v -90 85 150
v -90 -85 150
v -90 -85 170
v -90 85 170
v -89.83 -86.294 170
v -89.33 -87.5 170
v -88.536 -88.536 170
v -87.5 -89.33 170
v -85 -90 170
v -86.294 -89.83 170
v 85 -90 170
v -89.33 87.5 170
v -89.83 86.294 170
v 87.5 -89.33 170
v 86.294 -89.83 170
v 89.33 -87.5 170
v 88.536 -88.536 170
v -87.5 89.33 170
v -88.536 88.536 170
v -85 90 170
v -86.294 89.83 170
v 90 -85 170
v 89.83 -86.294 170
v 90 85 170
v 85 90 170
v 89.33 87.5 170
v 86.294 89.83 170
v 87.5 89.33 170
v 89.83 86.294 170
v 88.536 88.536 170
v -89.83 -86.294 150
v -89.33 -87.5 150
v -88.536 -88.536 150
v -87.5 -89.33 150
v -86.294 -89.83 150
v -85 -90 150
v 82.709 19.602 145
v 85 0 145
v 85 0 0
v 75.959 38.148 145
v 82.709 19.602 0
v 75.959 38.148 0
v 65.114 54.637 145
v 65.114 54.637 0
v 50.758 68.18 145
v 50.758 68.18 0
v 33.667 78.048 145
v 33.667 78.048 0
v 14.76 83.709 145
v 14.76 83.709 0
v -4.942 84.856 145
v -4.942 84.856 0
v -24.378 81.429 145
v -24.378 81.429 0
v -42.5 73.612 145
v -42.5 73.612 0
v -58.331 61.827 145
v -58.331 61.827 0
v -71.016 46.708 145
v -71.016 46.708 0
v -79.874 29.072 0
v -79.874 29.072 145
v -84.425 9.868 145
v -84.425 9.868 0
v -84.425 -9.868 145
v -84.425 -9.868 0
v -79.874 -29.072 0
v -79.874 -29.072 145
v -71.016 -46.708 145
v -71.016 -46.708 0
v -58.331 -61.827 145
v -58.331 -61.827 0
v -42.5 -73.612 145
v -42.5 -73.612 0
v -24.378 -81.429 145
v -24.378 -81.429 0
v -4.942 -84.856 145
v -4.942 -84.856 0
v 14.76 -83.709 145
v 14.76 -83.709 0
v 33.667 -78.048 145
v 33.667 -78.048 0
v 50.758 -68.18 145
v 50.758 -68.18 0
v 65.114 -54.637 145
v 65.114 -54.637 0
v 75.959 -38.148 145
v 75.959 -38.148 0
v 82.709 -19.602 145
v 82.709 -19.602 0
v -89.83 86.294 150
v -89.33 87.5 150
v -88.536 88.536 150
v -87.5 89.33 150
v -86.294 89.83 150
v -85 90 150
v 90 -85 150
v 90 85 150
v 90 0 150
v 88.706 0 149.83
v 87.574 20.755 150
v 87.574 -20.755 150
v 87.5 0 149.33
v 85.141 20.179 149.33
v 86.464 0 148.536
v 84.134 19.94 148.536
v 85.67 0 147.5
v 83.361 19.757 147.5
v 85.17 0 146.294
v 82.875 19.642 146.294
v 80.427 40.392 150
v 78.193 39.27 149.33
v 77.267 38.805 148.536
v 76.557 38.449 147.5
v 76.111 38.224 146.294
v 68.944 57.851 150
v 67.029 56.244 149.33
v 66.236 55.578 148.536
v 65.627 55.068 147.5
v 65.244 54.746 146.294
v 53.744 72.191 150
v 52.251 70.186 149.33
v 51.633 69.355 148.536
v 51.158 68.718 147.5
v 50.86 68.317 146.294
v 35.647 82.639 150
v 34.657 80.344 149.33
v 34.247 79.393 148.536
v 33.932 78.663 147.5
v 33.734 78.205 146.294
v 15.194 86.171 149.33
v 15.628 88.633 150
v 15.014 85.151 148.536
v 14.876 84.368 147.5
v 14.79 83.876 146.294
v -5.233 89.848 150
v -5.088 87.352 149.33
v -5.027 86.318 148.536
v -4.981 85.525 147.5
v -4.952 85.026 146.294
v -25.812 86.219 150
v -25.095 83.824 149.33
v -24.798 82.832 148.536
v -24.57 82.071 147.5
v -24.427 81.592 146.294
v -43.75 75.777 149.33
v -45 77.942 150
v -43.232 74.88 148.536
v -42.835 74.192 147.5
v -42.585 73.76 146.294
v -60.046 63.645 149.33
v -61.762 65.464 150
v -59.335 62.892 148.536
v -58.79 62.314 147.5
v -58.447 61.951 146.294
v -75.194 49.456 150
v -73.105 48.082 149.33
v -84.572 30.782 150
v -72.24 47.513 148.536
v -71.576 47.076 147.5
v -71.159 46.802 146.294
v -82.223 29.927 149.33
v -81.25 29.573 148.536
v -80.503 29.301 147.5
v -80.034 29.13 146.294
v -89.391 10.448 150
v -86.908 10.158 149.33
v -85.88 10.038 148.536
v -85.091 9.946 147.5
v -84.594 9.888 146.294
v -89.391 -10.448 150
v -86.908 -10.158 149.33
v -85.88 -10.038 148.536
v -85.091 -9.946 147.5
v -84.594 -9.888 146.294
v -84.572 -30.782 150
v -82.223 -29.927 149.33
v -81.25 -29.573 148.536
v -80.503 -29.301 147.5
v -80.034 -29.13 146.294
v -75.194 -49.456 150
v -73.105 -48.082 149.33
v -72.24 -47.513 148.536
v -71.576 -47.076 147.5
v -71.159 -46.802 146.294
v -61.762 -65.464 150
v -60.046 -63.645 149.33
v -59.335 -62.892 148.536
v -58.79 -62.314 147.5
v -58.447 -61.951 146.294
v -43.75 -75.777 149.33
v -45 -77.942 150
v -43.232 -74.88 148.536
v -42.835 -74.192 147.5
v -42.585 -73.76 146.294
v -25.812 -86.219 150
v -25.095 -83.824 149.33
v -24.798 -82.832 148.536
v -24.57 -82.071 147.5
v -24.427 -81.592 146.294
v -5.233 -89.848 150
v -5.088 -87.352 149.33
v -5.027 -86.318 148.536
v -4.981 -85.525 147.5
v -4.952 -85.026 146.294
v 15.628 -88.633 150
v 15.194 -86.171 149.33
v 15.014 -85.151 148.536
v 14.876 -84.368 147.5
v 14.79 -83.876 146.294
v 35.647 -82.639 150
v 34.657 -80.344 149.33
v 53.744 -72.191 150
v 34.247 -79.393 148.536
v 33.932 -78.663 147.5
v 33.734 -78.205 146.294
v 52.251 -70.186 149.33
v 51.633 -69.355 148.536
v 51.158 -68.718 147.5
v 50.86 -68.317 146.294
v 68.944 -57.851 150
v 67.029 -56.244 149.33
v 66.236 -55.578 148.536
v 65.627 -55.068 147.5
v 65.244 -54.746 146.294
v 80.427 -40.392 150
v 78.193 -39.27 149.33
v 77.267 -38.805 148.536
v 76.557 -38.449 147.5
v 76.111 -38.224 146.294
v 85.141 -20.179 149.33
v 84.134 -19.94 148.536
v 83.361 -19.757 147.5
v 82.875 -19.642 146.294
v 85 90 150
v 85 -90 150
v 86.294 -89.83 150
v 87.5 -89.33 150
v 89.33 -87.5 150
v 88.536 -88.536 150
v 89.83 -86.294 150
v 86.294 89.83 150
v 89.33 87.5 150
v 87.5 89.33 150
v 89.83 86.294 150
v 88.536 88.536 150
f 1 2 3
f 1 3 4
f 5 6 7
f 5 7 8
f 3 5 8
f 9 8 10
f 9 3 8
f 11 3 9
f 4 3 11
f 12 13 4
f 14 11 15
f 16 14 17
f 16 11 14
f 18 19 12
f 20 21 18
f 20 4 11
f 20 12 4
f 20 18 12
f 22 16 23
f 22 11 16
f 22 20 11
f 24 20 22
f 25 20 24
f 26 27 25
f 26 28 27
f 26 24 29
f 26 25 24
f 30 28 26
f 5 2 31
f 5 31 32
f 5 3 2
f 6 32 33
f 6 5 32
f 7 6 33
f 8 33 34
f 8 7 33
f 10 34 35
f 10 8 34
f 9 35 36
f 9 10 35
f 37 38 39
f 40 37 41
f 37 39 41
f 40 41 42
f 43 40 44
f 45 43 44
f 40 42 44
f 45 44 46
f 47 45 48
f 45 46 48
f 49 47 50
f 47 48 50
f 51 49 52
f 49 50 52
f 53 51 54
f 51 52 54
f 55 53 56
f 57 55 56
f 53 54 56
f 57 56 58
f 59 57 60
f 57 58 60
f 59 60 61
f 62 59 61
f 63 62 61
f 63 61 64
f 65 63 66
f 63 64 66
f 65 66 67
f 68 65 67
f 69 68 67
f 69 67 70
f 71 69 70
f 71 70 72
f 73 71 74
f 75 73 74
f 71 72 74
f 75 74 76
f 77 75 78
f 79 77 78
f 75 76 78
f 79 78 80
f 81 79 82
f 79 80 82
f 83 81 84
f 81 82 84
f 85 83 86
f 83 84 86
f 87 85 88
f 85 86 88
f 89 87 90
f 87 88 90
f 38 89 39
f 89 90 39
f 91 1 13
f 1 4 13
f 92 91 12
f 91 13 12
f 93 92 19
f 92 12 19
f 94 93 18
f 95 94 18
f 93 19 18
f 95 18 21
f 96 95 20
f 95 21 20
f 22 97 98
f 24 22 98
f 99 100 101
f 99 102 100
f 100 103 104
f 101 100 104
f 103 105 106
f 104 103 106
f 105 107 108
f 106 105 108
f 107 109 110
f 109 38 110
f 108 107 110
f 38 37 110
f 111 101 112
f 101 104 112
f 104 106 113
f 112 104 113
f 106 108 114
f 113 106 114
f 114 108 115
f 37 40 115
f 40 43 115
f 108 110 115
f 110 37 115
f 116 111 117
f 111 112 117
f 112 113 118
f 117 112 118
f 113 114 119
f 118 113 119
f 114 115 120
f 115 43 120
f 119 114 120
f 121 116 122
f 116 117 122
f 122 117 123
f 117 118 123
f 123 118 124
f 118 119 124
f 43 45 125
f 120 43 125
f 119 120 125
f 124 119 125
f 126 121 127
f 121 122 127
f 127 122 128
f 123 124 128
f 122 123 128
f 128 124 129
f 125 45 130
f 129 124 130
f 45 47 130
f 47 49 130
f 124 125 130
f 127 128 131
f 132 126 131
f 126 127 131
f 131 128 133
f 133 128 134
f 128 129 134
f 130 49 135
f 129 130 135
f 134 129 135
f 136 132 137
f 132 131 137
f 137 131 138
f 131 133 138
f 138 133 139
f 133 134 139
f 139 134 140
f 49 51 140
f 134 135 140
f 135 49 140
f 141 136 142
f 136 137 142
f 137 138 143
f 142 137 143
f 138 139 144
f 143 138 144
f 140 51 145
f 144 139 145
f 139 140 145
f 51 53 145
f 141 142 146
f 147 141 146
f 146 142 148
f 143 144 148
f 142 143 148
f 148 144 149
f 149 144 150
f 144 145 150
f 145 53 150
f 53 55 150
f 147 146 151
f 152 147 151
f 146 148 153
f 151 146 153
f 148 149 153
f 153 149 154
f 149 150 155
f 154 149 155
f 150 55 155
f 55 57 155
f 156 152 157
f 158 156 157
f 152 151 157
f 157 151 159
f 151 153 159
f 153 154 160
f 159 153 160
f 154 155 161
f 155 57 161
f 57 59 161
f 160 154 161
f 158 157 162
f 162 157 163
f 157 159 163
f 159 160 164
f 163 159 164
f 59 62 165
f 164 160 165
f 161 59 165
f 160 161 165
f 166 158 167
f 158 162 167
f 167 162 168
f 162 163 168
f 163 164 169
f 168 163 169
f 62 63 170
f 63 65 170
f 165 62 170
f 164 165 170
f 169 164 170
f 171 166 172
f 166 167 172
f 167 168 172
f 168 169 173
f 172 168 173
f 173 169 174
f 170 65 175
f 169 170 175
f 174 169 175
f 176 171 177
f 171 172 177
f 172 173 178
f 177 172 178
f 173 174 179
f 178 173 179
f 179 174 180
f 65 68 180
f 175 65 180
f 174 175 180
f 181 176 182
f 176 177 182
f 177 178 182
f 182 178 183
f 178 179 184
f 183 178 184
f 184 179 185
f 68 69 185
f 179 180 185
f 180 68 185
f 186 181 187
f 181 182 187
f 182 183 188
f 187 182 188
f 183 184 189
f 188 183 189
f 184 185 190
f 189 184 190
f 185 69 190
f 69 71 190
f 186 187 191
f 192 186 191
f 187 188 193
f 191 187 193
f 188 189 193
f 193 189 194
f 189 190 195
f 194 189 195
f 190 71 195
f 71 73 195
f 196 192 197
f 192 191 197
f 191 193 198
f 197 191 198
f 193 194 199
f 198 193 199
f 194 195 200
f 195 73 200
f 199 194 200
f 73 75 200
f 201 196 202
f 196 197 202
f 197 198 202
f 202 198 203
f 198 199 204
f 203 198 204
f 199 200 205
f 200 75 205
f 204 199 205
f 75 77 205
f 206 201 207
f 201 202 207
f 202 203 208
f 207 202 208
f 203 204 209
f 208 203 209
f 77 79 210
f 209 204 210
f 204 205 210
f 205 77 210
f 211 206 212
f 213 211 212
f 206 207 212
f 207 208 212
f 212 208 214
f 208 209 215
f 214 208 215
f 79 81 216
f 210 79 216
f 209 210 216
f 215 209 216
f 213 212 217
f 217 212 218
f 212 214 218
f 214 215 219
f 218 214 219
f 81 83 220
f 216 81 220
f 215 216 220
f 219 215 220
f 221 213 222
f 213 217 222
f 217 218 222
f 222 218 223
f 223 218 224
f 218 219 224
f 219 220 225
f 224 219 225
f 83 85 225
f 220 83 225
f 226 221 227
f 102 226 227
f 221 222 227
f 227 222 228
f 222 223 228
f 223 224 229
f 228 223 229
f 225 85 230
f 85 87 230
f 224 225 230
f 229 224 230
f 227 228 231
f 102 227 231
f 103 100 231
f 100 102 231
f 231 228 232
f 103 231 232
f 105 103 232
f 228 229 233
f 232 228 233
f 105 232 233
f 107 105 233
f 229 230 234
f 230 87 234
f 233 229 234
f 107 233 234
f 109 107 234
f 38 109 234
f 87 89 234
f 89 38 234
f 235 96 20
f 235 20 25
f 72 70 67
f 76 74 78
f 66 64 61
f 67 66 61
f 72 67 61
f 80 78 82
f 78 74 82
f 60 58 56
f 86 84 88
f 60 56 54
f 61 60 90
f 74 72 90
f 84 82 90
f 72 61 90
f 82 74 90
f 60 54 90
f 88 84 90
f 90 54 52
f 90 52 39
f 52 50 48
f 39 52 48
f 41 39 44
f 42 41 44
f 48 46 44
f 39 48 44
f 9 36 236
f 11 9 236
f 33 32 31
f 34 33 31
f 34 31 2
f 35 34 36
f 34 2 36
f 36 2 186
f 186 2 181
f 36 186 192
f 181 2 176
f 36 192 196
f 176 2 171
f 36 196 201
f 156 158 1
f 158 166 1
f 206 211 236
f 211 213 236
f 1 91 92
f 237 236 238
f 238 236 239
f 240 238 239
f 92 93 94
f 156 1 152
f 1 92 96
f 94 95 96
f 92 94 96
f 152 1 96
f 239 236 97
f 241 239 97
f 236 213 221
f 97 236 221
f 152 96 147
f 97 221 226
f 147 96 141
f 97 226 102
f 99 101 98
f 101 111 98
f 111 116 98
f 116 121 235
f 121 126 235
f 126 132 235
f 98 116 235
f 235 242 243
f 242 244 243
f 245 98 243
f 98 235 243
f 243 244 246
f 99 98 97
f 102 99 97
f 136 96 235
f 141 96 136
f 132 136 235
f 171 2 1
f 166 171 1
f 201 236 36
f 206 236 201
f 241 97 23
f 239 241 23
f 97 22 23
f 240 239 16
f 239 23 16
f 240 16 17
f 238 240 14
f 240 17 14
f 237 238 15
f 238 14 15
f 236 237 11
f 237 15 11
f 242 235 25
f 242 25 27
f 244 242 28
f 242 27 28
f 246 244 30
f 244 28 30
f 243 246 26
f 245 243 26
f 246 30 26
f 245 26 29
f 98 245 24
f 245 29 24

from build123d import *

# Parameters (mm, degrees)
ESQUISSE1_R        = 85
BOSS_EXTRU_1_DEPTH = 150
ESQUISSE2_W        = 180
ESQUISSE2_H        = 180
BOSS_EXTRU_2_DEPTH = 20
CONG_1_R           = 5
CONG_2_R           = 5
CONG_3_R           = 5
CONG_4_R           = 5
CONG_5_R           = 5


with BuildPart() as part:
    # Esquisse1 → Boss.-Extru.1 (new body)
    with BuildSketch(Plane.XY):
        Circle(ESQUISSE1_R)
    extrude(amount=BOSS_EXTRU_1_DEPTH)

    # Esquisse2 → Boss.-Extru.2 (add)
    with BuildSketch(Plane.XY.offset(150)):
        Rectangle(ESQUISSE2_W, ESQUISSE2_H)
    extrude(amount=BOSS_EXTRU_2_DEPTH)

    # Congé1
    cong_1_edges = [part.edges().sort_by_distance(p)[0] for p in [
        (-85, 0, 150),
    ]]
    fillet(cong_1_edges, radius=CONG_1_R - 0.0001)  # a hair under: the kernel refuses the full size

    # Congé2
    cong_2_edges = [part.edges().sort_by_distance(p)[0] for p in [
        (-90, 90, 160),
    ]]
    fillet(cong_2_edges, radius=CONG_2_R)

    # Congé3
    cong_3_edges = [part.edges().sort_by_distance(p)[0] for p in [
        (-90, -90, 160),
    ]]
    fillet(cong_3_edges, radius=CONG_3_R)

    # Congé4
    cong_4_edges = [part.edges().sort_by_distance(p)[0] for p in [
        (90, 90, 160),
    ]]
    fillet(cong_4_edges, radius=CONG_4_R)

    # Congé5
    cong_5_edges = [part.edges().sort_by_distance(p)[0] for p in [
        (90, -90, 160),
    ]]
    fillet(cong_5_edges, radius=CONG_5_R)


solid = part.part
